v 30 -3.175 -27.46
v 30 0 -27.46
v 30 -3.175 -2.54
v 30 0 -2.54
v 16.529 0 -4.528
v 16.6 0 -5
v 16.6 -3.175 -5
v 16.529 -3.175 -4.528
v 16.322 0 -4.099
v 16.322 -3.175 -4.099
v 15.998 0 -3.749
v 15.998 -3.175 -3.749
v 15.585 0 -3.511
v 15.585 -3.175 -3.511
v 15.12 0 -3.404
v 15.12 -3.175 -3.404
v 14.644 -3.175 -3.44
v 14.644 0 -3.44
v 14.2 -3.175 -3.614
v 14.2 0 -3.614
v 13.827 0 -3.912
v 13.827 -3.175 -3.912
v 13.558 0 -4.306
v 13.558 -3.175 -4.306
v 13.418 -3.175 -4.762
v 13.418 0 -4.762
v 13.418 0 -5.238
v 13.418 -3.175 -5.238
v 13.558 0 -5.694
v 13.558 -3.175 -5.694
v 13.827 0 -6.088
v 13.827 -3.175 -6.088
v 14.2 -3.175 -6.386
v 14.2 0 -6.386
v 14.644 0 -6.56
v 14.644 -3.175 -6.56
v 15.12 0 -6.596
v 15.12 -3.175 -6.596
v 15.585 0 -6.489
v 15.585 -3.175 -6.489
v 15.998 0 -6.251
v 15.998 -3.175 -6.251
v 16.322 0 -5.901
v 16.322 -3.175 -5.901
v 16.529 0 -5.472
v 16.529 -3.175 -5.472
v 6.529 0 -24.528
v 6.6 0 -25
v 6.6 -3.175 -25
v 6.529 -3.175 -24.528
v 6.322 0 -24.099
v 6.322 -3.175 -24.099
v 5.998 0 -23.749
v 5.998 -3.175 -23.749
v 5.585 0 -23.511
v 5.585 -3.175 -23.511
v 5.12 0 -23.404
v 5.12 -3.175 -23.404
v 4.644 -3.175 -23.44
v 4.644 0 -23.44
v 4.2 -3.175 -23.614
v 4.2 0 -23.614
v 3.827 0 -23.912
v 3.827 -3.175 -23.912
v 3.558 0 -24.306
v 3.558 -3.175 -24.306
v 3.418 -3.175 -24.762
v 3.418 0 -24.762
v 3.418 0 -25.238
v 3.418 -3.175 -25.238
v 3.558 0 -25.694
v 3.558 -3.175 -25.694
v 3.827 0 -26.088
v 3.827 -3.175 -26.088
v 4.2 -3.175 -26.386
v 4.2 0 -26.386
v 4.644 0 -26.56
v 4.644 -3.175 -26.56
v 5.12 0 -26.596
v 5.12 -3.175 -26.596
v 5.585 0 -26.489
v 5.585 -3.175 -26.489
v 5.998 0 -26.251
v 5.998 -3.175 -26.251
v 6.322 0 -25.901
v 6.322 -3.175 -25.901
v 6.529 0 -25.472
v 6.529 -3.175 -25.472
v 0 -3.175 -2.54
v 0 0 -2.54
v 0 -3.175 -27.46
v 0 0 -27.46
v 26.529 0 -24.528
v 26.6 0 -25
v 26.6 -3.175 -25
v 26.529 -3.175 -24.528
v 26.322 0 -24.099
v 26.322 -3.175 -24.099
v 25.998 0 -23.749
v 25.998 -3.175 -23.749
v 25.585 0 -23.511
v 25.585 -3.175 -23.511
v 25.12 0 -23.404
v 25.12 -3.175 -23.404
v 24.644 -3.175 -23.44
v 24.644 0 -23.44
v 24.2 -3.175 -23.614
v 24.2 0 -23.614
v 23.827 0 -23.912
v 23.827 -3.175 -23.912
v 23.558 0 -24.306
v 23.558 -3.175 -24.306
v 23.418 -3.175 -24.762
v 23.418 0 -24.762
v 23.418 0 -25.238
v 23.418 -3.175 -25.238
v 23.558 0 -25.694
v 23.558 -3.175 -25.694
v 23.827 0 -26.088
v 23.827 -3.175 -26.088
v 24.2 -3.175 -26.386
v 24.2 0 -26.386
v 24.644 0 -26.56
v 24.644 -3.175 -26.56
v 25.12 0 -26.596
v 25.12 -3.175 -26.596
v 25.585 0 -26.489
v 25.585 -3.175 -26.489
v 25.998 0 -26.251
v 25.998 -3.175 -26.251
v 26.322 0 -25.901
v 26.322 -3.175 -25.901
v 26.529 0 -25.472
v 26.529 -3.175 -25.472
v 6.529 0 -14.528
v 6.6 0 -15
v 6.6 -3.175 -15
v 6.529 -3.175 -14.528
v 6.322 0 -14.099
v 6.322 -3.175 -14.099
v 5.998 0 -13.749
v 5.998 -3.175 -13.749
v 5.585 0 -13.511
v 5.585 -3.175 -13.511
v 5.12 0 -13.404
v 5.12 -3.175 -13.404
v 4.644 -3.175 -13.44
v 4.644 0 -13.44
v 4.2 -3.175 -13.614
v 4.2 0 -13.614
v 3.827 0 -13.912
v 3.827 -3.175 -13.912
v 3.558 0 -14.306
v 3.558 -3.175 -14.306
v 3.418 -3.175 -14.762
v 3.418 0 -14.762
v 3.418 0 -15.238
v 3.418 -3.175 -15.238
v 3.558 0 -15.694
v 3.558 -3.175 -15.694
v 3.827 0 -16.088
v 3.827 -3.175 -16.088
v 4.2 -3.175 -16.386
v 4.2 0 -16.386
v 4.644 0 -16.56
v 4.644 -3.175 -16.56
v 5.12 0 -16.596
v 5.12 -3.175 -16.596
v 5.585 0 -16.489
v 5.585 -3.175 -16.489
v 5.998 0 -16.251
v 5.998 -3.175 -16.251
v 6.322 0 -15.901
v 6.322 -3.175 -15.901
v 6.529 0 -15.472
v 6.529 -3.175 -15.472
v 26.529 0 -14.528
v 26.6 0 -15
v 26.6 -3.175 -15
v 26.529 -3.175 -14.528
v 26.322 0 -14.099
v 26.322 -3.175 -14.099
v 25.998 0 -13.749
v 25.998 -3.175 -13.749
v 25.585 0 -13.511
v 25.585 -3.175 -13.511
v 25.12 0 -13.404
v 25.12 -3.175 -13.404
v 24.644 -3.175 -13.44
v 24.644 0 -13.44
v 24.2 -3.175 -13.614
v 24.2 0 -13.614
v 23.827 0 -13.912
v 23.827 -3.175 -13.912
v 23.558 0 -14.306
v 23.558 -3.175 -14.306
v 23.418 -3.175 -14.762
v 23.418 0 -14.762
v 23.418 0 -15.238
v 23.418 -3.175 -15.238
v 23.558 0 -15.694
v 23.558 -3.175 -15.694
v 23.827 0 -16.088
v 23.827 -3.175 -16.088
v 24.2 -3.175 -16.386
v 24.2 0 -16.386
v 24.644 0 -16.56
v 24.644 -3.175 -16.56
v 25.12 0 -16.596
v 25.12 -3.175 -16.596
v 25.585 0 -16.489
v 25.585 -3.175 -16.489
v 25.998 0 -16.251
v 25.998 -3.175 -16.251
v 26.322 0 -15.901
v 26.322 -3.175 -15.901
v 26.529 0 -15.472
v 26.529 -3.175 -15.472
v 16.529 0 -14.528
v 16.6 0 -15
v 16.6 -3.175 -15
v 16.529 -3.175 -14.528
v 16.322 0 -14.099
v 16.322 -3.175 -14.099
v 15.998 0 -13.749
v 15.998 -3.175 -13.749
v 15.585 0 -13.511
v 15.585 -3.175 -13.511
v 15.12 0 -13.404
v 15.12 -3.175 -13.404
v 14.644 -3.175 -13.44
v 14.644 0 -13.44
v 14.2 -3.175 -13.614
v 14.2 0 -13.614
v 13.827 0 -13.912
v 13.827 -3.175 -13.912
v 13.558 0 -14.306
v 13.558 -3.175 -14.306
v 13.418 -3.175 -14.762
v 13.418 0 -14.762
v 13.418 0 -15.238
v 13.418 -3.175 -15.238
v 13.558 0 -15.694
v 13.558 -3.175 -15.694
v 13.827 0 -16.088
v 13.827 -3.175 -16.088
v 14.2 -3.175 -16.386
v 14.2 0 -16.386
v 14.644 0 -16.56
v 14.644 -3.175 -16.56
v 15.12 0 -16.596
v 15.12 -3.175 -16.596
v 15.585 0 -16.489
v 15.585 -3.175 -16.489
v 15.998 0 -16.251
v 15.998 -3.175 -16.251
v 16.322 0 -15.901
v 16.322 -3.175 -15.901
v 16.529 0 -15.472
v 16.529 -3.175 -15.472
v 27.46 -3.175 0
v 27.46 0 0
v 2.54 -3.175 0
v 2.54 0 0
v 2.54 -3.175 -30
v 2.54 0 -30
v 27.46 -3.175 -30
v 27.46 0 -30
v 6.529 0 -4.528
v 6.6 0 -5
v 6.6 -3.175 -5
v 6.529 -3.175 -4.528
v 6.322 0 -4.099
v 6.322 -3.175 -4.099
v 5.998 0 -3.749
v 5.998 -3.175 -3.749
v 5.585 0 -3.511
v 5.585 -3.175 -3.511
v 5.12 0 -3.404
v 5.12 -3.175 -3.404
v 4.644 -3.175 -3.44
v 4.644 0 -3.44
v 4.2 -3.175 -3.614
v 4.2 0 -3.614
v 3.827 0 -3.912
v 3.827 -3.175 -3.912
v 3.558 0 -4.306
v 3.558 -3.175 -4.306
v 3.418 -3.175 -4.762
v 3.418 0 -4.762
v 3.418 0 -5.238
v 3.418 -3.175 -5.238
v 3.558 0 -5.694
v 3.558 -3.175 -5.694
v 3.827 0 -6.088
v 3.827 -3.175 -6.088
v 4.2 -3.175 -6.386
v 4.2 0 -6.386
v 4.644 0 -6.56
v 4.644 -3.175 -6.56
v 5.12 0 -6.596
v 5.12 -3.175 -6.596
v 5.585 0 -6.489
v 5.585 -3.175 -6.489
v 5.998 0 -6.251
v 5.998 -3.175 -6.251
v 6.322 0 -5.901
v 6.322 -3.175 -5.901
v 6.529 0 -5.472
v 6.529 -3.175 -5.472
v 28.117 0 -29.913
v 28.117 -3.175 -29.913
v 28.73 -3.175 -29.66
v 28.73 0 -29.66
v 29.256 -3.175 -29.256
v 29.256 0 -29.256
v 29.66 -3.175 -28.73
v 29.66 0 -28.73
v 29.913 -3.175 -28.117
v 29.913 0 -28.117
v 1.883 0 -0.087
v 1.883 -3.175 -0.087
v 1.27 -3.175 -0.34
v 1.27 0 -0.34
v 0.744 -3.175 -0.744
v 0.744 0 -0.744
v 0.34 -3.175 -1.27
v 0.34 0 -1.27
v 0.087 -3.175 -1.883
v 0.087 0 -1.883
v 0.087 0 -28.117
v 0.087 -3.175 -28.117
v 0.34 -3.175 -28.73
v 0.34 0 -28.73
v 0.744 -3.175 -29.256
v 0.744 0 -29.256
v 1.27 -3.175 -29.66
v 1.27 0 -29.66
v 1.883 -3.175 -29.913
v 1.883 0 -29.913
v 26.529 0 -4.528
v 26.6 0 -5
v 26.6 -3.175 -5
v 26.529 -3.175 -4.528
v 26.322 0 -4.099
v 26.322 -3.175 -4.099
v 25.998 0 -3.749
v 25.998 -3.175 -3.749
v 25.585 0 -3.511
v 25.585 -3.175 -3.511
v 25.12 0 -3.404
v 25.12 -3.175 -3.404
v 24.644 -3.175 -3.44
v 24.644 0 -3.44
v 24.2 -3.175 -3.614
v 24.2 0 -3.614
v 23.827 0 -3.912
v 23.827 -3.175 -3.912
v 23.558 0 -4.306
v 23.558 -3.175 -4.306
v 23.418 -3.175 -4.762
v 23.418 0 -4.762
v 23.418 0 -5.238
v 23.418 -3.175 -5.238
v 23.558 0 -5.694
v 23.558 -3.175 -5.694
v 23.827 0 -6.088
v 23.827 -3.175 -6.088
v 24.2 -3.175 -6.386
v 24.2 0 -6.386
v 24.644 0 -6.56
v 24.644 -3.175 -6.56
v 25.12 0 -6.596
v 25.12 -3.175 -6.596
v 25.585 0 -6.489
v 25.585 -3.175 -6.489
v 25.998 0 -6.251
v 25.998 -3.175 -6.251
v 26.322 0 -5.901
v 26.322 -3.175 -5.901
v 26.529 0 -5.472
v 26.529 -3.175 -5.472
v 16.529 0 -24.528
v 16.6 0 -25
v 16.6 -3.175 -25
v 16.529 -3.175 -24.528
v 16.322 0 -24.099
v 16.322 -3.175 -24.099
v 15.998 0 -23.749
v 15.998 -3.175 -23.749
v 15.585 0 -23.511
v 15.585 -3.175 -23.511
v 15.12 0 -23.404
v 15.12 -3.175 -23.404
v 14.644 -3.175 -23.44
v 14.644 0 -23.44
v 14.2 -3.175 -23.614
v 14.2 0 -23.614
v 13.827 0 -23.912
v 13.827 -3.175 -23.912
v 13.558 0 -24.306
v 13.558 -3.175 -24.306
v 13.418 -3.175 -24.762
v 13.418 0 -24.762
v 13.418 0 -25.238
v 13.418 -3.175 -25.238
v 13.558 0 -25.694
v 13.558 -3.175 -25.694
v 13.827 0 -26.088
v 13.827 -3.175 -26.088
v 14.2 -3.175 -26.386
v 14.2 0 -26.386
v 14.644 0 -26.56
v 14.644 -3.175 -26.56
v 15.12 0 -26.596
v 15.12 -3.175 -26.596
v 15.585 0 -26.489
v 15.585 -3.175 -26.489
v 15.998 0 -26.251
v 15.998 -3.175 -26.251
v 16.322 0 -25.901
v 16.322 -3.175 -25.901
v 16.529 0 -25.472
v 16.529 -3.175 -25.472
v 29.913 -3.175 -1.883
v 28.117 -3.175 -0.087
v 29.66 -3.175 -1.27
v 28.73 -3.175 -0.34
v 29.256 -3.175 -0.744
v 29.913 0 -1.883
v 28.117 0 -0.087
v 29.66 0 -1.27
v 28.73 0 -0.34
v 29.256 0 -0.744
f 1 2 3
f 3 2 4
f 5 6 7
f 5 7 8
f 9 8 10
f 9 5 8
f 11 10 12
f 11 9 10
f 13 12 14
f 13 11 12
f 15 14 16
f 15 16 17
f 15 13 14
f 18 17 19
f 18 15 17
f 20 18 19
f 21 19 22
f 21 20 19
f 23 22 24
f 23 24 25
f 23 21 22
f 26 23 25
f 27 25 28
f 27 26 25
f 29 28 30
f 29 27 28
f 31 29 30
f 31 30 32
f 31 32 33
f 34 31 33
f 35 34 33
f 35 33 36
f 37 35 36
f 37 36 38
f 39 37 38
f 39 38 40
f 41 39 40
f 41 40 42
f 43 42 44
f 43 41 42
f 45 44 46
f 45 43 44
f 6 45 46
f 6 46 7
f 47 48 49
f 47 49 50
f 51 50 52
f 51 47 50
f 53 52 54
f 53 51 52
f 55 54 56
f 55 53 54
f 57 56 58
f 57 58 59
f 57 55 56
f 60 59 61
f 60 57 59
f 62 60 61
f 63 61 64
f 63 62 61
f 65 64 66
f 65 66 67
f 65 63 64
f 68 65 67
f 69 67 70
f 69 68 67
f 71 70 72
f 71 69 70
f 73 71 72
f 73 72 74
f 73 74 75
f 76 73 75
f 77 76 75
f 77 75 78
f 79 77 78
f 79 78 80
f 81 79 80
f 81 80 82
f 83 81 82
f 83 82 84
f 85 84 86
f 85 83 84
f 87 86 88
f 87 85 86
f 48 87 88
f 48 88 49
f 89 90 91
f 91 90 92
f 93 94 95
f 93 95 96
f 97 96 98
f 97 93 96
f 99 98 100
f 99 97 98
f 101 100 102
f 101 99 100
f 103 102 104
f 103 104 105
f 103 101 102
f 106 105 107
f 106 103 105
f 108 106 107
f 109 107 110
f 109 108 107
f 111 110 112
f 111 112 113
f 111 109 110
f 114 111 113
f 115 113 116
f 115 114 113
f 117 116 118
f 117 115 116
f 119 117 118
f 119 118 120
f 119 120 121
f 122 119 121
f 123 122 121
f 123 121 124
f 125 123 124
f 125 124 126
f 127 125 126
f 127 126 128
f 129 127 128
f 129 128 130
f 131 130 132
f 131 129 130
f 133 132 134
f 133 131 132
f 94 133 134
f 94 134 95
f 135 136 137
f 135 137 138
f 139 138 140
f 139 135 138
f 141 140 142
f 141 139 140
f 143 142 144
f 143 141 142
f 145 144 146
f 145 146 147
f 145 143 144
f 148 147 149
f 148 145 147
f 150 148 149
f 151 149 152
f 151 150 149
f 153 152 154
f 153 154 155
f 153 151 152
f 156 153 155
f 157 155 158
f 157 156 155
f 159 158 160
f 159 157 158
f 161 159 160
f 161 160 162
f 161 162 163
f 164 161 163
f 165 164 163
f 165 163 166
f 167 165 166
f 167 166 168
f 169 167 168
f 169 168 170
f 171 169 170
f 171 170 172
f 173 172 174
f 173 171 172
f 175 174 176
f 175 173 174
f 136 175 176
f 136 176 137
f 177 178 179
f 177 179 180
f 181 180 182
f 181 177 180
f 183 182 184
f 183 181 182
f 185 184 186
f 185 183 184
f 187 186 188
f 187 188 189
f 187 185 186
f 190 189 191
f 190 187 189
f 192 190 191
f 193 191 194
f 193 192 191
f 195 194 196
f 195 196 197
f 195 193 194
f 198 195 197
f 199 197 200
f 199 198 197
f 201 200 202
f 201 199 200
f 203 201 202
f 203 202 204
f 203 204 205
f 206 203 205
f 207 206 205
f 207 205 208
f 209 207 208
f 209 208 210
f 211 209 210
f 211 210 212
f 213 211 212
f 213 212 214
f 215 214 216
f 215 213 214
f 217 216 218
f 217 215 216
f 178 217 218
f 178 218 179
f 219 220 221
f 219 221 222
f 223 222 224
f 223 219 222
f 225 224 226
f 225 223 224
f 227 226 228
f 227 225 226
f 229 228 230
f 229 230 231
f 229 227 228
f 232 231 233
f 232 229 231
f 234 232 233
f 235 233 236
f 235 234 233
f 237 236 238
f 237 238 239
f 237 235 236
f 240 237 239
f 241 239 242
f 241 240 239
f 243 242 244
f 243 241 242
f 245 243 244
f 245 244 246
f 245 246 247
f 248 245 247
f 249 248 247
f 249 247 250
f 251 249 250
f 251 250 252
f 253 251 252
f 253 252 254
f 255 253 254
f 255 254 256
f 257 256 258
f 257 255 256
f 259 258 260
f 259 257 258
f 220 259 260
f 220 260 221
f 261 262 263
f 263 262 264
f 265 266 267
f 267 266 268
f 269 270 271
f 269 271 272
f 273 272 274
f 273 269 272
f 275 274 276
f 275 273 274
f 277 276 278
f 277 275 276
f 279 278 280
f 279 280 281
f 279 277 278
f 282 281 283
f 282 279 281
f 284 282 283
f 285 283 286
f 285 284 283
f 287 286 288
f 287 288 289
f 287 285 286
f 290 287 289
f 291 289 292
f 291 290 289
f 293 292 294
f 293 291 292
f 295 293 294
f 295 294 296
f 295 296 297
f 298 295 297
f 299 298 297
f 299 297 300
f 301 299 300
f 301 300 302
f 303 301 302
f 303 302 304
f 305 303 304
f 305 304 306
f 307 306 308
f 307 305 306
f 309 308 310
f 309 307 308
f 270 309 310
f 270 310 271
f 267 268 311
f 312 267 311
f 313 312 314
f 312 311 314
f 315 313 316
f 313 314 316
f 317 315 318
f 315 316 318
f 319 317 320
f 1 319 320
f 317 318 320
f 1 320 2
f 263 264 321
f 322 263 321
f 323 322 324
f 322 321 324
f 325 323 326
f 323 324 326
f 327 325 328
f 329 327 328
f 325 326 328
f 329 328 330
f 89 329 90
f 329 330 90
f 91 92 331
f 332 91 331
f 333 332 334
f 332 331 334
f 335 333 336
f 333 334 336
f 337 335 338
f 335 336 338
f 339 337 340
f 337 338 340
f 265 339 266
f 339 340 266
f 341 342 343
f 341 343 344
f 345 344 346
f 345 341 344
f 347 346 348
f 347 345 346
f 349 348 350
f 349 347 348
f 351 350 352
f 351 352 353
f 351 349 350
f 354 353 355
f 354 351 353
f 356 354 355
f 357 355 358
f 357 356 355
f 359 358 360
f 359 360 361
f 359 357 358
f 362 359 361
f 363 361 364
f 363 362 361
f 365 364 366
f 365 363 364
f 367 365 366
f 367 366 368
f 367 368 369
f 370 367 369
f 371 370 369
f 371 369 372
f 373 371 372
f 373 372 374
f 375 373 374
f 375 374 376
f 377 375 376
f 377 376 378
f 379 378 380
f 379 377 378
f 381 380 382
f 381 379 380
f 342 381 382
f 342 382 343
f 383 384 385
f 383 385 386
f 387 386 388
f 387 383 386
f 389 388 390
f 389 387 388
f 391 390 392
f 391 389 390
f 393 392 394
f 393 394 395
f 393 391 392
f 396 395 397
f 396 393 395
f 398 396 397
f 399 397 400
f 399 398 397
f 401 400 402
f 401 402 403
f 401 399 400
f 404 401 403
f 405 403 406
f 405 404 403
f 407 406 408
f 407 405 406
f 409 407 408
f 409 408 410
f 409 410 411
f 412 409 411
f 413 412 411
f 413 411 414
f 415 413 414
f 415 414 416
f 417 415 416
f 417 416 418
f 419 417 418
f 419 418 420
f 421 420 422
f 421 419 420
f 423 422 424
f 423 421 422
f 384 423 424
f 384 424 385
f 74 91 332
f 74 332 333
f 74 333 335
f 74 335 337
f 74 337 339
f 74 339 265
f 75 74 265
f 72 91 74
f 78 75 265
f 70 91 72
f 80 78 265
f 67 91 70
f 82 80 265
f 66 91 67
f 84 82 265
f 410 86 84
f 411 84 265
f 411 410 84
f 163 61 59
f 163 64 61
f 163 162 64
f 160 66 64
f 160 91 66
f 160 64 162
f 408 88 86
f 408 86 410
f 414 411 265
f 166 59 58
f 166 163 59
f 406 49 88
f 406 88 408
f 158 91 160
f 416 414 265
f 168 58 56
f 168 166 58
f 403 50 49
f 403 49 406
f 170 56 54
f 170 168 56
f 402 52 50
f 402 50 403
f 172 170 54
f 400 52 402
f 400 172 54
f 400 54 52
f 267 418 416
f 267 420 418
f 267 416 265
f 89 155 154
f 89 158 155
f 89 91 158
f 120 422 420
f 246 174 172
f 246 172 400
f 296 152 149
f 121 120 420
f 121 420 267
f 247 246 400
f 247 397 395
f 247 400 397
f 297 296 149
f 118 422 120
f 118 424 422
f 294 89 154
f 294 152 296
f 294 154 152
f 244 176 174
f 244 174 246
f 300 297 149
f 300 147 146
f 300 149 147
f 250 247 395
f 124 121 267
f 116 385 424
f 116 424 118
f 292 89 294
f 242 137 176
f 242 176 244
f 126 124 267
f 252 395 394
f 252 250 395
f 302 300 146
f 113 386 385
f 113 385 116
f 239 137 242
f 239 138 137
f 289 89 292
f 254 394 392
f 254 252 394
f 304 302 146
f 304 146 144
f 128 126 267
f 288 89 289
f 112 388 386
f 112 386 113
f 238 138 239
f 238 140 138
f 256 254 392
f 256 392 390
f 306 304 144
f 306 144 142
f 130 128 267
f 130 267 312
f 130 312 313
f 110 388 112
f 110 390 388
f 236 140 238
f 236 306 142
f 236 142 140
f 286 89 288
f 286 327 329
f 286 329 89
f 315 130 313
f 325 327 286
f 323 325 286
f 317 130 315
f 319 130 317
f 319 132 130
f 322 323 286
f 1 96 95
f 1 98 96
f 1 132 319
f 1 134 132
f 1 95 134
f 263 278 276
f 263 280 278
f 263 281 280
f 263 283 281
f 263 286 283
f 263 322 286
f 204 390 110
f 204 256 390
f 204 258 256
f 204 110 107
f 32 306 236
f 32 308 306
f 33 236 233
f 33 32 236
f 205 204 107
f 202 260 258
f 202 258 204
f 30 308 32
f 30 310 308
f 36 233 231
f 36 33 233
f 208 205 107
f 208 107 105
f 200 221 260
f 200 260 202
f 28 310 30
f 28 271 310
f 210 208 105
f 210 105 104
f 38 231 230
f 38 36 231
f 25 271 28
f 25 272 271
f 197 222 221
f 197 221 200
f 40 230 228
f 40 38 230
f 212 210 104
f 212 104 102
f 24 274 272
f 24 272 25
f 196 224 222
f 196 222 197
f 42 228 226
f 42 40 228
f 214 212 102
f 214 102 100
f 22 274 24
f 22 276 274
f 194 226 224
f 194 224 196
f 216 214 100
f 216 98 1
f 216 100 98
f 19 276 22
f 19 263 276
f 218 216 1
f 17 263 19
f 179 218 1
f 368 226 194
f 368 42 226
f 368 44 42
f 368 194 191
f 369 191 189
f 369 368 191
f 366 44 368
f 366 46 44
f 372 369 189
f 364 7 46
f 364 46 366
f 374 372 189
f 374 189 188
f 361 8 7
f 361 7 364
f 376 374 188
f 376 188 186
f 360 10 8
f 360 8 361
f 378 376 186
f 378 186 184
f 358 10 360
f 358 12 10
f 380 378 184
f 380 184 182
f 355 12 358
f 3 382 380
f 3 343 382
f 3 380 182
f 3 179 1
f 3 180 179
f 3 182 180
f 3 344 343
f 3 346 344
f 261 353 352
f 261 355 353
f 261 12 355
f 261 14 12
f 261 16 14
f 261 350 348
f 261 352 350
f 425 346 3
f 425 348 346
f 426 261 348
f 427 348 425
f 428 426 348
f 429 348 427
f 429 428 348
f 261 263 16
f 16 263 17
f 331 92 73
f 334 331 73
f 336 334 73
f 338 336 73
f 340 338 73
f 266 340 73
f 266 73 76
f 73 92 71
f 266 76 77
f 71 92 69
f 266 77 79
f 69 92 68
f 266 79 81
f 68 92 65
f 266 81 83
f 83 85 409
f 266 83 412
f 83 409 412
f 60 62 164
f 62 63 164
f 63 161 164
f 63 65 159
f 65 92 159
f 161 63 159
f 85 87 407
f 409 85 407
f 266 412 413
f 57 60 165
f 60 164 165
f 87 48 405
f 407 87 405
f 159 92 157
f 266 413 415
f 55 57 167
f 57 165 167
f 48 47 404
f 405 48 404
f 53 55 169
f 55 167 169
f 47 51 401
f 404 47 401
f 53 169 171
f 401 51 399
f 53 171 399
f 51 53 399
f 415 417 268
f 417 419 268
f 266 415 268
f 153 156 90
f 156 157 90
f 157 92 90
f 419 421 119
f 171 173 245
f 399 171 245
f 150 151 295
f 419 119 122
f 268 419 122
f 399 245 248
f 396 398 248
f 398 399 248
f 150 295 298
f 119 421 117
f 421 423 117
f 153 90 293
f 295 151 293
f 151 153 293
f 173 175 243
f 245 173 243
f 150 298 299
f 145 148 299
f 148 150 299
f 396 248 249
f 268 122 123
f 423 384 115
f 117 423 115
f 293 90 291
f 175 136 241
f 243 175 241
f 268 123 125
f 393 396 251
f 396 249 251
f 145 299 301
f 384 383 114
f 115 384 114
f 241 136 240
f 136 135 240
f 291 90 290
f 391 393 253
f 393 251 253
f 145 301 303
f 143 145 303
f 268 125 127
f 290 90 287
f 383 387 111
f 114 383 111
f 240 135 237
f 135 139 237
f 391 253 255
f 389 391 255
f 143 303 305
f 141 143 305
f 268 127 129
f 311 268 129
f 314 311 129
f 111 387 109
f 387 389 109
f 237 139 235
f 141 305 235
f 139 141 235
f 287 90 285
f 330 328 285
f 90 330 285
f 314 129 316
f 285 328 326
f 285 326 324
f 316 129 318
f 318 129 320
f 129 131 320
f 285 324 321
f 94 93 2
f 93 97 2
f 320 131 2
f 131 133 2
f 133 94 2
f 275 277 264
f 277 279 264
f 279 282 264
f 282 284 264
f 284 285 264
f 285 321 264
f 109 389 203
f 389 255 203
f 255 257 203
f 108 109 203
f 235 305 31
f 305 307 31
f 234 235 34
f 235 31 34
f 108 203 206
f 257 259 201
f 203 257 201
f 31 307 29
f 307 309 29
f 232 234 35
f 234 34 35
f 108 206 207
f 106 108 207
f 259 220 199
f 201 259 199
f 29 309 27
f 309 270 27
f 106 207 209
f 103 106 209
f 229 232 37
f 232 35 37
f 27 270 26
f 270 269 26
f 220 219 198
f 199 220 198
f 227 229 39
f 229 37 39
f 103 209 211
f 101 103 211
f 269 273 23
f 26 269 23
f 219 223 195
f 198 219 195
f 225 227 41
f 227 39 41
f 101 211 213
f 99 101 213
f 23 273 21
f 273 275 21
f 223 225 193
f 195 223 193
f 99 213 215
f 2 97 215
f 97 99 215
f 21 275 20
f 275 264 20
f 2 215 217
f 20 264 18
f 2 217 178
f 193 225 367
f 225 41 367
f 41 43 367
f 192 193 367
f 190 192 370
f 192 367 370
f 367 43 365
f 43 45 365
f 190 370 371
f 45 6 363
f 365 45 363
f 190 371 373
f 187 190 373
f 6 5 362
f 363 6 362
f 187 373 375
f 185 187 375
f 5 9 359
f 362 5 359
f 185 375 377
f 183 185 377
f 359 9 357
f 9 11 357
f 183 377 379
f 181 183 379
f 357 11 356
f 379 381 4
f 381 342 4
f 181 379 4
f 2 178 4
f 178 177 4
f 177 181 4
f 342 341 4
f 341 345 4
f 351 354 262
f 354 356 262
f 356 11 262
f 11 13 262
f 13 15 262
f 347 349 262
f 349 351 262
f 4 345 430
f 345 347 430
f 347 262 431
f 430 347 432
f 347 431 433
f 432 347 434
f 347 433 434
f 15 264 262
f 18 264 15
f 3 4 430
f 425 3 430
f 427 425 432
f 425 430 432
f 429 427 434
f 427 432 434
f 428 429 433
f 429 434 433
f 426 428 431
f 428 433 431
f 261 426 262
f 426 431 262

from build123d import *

# Parameters (mm, degrees)
F0_R     = 1.6
F1_DEPTH = 3.175


# Not quite as in the source:
# - a length typed as a fraction of an inch, garbled in the dataset ("3 / 203.2 mm" for 3/8 in), is restored


with BuildPart() as f1:
    # F0 (on Front) → F1 (new body)
    with BuildSketch(Plane.XZ):
        with BuildLine():
            Line((27.46, 0), (2.54, 0))
            ThreePointArc((2.54, 0), (0.7439487758, -0.7439487758), (0, -2.54))
            Line((0, -2.54), (0, -27.46))
            ThreePointArc((0, -27.46), (0.7439487758, -29.2560512242), (2.54, -30))
            Line((2.54, -30), (27.46, -30))
            ThreePointArc((27.46, -30), (29.2560512242, -29.2560512242), (30, -27.46))
            Line((30, -27.46), (30, -2.54))
            ThreePointArc((30, -2.54), (29.2560512242, -0.7439487758), (27.46, 0))
        make_face()
        with Locations((5, -25)):
            Circle(F0_R, mode=Mode.SUBTRACT)
        with Locations((15, -25)):
            Circle(F0_R, mode=Mode.SUBTRACT)
        with Locations((25, -25)):
            Circle(F0_R, mode=Mode.SUBTRACT)
        with Locations((5, -15)):
            Circle(F0_R, mode=Mode.SUBTRACT)
        with Locations((5, -5)):
            Circle(F0_R, mode=Mode.SUBTRACT)
        with Locations((15, -15)):
            Circle(F0_R, mode=Mode.SUBTRACT)
        with Locations((25, -15)):
            Circle(F0_R, mode=Mode.SUBTRACT)
        with Locations((15, -5)):
            Circle(F0_R, mode=Mode.SUBTRACT)
        with Locations((25, -5)):
            Circle(F0_R, mode=Mode.SUBTRACT)
    extrude(amount=F1_DEPTH)


solid = f1.part
